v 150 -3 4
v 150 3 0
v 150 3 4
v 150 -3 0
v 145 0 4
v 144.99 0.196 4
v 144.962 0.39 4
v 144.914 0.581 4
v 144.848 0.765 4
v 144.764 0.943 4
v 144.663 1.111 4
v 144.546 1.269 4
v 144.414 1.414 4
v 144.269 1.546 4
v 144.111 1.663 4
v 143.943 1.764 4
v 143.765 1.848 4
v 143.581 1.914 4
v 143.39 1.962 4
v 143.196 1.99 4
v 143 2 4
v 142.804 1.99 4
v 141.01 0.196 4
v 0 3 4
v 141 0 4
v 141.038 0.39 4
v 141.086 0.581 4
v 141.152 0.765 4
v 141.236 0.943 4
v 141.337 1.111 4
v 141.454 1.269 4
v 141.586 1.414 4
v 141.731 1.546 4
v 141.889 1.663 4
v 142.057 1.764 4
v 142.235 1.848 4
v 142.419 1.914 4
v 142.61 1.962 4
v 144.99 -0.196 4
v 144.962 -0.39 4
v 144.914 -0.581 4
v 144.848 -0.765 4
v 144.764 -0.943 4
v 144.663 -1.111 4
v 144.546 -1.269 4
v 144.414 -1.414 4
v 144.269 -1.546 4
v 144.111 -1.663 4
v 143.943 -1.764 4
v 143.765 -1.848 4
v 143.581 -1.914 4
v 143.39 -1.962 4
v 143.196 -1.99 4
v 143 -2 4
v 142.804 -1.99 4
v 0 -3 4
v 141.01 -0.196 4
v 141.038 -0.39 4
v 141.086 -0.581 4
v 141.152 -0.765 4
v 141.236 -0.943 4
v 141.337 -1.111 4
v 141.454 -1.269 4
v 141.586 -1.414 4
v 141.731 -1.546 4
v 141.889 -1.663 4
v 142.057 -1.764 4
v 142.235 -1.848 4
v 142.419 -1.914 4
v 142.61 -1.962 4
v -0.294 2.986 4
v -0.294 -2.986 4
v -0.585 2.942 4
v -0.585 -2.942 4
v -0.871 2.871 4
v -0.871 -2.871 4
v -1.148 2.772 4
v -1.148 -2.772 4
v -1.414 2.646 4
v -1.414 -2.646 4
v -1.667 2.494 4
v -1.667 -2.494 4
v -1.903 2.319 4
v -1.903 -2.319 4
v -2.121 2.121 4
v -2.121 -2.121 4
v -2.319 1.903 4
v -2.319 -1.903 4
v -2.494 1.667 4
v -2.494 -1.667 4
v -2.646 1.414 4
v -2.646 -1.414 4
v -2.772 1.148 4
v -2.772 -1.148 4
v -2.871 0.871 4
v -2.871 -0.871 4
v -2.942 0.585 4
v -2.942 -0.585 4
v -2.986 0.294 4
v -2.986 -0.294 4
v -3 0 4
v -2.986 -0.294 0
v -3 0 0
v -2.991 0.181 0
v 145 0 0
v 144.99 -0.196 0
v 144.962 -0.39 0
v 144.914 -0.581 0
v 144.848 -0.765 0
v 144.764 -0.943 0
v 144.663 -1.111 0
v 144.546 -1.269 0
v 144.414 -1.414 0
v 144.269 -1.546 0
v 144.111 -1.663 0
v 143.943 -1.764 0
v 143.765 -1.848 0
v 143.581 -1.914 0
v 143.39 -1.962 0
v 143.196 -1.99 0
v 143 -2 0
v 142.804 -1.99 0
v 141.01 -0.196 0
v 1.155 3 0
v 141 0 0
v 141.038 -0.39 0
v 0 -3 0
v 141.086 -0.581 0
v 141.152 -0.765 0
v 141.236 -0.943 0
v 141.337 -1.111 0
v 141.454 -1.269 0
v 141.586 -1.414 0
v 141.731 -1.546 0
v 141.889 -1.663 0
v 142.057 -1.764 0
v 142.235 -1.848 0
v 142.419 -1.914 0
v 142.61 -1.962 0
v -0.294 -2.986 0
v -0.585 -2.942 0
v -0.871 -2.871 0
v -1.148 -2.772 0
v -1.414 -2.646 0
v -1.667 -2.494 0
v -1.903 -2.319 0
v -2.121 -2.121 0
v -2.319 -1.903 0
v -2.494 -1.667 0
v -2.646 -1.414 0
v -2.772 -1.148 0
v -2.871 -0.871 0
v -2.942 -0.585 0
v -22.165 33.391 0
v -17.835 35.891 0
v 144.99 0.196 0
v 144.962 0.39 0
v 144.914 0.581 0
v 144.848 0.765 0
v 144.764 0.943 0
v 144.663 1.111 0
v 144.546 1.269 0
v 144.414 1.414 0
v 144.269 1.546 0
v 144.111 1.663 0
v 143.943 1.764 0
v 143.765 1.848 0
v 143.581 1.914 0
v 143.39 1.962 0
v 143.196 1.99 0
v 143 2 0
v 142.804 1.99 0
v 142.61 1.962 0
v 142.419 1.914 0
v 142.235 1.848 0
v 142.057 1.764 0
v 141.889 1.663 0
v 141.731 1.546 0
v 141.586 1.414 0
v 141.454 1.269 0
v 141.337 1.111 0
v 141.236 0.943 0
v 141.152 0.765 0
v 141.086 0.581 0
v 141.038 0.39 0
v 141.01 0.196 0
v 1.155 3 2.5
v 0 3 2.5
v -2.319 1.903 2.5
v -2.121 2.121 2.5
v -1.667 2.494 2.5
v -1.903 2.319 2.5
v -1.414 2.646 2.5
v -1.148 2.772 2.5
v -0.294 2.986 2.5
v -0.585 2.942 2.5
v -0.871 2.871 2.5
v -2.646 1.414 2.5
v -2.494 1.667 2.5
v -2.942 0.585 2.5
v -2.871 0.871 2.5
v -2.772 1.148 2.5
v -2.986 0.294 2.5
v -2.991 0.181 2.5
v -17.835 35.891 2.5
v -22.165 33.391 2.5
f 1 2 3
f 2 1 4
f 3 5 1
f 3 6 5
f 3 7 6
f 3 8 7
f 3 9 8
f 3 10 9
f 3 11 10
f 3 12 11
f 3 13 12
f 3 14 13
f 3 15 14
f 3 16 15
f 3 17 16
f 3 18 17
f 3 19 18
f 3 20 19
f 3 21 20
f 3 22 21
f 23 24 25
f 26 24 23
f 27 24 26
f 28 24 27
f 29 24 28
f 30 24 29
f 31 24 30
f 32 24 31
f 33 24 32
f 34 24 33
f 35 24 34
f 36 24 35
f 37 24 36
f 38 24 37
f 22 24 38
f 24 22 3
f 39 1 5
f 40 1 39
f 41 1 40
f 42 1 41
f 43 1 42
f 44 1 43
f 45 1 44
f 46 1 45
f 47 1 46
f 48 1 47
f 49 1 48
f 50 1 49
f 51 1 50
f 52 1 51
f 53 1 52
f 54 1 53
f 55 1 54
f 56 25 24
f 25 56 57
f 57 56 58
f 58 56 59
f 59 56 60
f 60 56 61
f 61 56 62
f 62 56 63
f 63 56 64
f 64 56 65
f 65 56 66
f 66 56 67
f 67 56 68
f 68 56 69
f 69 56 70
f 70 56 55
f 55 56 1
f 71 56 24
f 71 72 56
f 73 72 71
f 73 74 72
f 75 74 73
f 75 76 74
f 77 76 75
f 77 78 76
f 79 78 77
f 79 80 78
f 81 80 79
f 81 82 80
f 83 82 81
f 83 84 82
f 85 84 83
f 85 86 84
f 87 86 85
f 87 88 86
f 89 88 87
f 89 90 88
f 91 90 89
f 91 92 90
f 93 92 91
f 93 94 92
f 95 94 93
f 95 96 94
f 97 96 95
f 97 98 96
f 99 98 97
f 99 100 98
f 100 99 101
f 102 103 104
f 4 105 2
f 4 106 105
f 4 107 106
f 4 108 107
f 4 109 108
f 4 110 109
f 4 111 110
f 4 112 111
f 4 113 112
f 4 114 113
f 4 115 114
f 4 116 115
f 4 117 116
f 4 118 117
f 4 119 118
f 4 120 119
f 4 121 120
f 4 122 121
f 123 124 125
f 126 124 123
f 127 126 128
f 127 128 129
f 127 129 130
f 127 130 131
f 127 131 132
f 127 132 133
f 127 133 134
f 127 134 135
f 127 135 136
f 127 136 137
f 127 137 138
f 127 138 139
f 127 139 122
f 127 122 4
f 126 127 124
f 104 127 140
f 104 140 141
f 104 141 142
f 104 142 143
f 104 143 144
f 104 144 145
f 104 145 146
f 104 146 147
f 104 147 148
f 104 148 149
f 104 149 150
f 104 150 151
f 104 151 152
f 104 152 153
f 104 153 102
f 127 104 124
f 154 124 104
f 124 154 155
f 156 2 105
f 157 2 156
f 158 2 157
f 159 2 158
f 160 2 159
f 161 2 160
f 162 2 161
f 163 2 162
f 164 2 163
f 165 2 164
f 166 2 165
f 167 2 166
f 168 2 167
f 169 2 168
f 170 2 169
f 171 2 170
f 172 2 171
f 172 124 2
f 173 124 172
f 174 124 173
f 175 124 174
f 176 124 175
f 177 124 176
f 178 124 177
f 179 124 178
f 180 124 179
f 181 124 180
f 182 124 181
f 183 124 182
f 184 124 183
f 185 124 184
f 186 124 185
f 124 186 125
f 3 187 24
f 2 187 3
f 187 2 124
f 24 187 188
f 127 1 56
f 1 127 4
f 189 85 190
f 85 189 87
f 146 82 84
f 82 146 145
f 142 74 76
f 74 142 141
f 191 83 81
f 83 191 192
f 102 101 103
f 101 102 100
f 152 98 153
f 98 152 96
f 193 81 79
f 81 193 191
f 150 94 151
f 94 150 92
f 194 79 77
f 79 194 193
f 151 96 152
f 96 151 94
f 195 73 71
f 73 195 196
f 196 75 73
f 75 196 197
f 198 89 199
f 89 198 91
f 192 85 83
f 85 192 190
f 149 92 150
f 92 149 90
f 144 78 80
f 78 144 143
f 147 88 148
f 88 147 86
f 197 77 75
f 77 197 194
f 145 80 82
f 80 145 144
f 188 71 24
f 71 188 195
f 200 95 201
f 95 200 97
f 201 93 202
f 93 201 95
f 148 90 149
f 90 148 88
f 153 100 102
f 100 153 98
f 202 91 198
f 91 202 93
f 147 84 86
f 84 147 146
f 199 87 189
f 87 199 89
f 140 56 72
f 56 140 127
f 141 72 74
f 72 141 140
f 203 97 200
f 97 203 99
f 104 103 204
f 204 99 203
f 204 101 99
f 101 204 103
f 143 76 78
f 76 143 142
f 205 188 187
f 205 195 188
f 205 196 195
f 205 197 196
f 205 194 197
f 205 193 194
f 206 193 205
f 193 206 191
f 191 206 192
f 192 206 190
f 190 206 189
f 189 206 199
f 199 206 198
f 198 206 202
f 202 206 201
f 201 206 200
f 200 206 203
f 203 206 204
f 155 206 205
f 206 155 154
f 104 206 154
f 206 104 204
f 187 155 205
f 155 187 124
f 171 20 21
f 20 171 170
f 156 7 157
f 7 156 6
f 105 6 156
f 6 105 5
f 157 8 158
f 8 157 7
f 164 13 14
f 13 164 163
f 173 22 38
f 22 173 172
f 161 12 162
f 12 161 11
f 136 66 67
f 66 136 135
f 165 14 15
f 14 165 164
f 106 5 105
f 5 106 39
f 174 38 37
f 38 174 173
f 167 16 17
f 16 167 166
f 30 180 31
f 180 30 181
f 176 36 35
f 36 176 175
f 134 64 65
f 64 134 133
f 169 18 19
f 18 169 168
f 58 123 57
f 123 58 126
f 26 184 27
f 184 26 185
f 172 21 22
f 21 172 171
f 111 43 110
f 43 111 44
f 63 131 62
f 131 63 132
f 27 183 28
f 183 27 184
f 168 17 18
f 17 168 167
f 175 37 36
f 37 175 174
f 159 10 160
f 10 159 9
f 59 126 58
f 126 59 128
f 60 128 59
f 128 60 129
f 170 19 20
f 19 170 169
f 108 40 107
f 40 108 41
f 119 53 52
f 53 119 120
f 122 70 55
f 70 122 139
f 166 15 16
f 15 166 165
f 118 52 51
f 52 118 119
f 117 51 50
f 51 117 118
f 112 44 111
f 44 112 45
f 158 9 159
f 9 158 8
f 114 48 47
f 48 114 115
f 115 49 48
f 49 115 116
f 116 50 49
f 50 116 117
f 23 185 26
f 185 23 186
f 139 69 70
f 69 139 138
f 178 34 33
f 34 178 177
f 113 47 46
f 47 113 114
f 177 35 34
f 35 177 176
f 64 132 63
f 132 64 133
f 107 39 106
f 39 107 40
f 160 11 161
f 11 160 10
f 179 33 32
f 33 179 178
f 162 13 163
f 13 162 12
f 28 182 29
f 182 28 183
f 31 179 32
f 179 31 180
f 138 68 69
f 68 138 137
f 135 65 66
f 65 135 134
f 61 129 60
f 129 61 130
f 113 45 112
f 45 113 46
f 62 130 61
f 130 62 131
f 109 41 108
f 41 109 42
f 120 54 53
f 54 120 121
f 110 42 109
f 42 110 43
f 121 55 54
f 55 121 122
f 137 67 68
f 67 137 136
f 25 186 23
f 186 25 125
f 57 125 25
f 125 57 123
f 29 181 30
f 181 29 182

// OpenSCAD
// L-shaped (hockey-stick) cell spreader for bacterial plating.
// Designed for FDM printing, lying flat on the XY plane.

// --- Dimensions ---
handle_l    = 150.0; // Length of the handle
handle_w    = 6.0;   // Width of the handle
handle_t    = 4.0;   // Thickness of the handle
foot_l      = 40.0;  // Length of the spreading foot
foot_w      = 5.0;   // Width of the spreading foot
foot_t      = 2.5;   // Thickness of the spreading foot
boss_d      = 6.0;   // Diameter of the joining boss
boss_h      = 4.0;   // Height of the joining boss
hole_d      = 4.0;   // Diameter of the hanging hole
angle_deg   = 120.0; // Angle between handle and foot (counter-clockwise from +X)

$fn = 64;

// --- Geometry Calculations ---
// The handle is centered on Y, so its Y range is [-handle_w/2, handle_w/2]
// The foot is rotated 120 degrees.

module spreader() {
    difference() {
        union() {
            // 1. The Handle
            // Centered on Y, extends from X=0 to X=handle_l
            translate([handle_l / 2, 0, 0])
                cube([handle_l, handle_w, handle_t], center = true);
            
            // Note: The prompt specifies x=0 to 150, y=-3 to 3, z=0 to 4.
            // To achieve this in OpenSCAD while centering on X/Y for printing:
            // We translate the cube so the corner is at the origin.
            // However, the prompt says "Two straight bars meet at the origin".
            // To ensure the part is centered on X/Y for the slicer:
            // We will build the part relative to the origin and then translate the whole thing.
            
            // Let's redefine the construction to be more precise to the prompt's geometry:
            // Handle: [0, 150] x [-3, 3] x [0, 4]
            // Foot: 40mm long, 5mm wide, 2.5mm thick, rotated 120 deg.
            
            // Handle
            translate([handle_l / 2, 0, handle_t / 2])
                cube([handle_l, handle_w, handle_t], center = true);

            // 2. The Boss (at the origin)
            // Prompt: 6mm diameter, 4mm tall at the origin.
            // To ensure it joins the bars, we place it at the junction.
            translate([0, 0, boss_h / 2])
                cylinder(h = boss_h, d = boss_d, center = true);

            // 3. The Foot
            // Center line starts at origin, points 120 deg CCW from +X.
            // Length 40, Width 5, Thickness 2.5.
            // We rotate the foot around the Z axis.
            // Since the foot is a bar, we create it centered on its own local origin 
            // and then rotate/translate.
            rotate([0, 0, angle_deg])
                translate([foot_l / 2, 0, foot_t / 2])
                    cube([foot_l, foot_w, foot_t], center = true);
        }

        // 4. The Hanging Hole
        // Through the handle at x = 143, y = 0.
        // We subtract a cylinder.
        translate([143, 0, -1])
            cylinder(h = handle_t + 2, d = hole_d);
    }
}

// Final assembly: The prompt describes the geometry relative to the origin.
// To make it "rest on the XY plane at z=0", we must adjust the Z offset.
// The handle is z=0 to 4, foot is z=0 to 2.5. 
// The boss is 4mm tall. 
// Since the handle is the thickest part (4mm), we align the bottom of the handle to Z=0.

// Re-calculating the assembly to ensure it sits on Z=0:
// Handle: Z from 0 to 4.
// Foot: Z from 0 to 2.5.
// Boss: Z from 0 to 4.

module final_spreader() {
    difference() {
        union() {
            // Handle
            translate([handle_l / 2, 0, handle_t / 2])
                cube([handle_l, handle_w, handle_t], center = true);
            
            // Boss
            translate([0, 0, boss_h / 2])
                cylinder(h = boss_h, d = boss_d, center = true);

            // Foot
            rotate([0, 0, angle_deg])
                translate([foot_l / 2, 0, foot_t / 2])
                    cube([foot_l, foot_w, foot_t], center = true);
        }
        
        // Hole
        translate([143, 0, -1])
            cylinder(h = handle_t + 2, d = hole_d);
    }
}

// Render the part
final_spreader();
